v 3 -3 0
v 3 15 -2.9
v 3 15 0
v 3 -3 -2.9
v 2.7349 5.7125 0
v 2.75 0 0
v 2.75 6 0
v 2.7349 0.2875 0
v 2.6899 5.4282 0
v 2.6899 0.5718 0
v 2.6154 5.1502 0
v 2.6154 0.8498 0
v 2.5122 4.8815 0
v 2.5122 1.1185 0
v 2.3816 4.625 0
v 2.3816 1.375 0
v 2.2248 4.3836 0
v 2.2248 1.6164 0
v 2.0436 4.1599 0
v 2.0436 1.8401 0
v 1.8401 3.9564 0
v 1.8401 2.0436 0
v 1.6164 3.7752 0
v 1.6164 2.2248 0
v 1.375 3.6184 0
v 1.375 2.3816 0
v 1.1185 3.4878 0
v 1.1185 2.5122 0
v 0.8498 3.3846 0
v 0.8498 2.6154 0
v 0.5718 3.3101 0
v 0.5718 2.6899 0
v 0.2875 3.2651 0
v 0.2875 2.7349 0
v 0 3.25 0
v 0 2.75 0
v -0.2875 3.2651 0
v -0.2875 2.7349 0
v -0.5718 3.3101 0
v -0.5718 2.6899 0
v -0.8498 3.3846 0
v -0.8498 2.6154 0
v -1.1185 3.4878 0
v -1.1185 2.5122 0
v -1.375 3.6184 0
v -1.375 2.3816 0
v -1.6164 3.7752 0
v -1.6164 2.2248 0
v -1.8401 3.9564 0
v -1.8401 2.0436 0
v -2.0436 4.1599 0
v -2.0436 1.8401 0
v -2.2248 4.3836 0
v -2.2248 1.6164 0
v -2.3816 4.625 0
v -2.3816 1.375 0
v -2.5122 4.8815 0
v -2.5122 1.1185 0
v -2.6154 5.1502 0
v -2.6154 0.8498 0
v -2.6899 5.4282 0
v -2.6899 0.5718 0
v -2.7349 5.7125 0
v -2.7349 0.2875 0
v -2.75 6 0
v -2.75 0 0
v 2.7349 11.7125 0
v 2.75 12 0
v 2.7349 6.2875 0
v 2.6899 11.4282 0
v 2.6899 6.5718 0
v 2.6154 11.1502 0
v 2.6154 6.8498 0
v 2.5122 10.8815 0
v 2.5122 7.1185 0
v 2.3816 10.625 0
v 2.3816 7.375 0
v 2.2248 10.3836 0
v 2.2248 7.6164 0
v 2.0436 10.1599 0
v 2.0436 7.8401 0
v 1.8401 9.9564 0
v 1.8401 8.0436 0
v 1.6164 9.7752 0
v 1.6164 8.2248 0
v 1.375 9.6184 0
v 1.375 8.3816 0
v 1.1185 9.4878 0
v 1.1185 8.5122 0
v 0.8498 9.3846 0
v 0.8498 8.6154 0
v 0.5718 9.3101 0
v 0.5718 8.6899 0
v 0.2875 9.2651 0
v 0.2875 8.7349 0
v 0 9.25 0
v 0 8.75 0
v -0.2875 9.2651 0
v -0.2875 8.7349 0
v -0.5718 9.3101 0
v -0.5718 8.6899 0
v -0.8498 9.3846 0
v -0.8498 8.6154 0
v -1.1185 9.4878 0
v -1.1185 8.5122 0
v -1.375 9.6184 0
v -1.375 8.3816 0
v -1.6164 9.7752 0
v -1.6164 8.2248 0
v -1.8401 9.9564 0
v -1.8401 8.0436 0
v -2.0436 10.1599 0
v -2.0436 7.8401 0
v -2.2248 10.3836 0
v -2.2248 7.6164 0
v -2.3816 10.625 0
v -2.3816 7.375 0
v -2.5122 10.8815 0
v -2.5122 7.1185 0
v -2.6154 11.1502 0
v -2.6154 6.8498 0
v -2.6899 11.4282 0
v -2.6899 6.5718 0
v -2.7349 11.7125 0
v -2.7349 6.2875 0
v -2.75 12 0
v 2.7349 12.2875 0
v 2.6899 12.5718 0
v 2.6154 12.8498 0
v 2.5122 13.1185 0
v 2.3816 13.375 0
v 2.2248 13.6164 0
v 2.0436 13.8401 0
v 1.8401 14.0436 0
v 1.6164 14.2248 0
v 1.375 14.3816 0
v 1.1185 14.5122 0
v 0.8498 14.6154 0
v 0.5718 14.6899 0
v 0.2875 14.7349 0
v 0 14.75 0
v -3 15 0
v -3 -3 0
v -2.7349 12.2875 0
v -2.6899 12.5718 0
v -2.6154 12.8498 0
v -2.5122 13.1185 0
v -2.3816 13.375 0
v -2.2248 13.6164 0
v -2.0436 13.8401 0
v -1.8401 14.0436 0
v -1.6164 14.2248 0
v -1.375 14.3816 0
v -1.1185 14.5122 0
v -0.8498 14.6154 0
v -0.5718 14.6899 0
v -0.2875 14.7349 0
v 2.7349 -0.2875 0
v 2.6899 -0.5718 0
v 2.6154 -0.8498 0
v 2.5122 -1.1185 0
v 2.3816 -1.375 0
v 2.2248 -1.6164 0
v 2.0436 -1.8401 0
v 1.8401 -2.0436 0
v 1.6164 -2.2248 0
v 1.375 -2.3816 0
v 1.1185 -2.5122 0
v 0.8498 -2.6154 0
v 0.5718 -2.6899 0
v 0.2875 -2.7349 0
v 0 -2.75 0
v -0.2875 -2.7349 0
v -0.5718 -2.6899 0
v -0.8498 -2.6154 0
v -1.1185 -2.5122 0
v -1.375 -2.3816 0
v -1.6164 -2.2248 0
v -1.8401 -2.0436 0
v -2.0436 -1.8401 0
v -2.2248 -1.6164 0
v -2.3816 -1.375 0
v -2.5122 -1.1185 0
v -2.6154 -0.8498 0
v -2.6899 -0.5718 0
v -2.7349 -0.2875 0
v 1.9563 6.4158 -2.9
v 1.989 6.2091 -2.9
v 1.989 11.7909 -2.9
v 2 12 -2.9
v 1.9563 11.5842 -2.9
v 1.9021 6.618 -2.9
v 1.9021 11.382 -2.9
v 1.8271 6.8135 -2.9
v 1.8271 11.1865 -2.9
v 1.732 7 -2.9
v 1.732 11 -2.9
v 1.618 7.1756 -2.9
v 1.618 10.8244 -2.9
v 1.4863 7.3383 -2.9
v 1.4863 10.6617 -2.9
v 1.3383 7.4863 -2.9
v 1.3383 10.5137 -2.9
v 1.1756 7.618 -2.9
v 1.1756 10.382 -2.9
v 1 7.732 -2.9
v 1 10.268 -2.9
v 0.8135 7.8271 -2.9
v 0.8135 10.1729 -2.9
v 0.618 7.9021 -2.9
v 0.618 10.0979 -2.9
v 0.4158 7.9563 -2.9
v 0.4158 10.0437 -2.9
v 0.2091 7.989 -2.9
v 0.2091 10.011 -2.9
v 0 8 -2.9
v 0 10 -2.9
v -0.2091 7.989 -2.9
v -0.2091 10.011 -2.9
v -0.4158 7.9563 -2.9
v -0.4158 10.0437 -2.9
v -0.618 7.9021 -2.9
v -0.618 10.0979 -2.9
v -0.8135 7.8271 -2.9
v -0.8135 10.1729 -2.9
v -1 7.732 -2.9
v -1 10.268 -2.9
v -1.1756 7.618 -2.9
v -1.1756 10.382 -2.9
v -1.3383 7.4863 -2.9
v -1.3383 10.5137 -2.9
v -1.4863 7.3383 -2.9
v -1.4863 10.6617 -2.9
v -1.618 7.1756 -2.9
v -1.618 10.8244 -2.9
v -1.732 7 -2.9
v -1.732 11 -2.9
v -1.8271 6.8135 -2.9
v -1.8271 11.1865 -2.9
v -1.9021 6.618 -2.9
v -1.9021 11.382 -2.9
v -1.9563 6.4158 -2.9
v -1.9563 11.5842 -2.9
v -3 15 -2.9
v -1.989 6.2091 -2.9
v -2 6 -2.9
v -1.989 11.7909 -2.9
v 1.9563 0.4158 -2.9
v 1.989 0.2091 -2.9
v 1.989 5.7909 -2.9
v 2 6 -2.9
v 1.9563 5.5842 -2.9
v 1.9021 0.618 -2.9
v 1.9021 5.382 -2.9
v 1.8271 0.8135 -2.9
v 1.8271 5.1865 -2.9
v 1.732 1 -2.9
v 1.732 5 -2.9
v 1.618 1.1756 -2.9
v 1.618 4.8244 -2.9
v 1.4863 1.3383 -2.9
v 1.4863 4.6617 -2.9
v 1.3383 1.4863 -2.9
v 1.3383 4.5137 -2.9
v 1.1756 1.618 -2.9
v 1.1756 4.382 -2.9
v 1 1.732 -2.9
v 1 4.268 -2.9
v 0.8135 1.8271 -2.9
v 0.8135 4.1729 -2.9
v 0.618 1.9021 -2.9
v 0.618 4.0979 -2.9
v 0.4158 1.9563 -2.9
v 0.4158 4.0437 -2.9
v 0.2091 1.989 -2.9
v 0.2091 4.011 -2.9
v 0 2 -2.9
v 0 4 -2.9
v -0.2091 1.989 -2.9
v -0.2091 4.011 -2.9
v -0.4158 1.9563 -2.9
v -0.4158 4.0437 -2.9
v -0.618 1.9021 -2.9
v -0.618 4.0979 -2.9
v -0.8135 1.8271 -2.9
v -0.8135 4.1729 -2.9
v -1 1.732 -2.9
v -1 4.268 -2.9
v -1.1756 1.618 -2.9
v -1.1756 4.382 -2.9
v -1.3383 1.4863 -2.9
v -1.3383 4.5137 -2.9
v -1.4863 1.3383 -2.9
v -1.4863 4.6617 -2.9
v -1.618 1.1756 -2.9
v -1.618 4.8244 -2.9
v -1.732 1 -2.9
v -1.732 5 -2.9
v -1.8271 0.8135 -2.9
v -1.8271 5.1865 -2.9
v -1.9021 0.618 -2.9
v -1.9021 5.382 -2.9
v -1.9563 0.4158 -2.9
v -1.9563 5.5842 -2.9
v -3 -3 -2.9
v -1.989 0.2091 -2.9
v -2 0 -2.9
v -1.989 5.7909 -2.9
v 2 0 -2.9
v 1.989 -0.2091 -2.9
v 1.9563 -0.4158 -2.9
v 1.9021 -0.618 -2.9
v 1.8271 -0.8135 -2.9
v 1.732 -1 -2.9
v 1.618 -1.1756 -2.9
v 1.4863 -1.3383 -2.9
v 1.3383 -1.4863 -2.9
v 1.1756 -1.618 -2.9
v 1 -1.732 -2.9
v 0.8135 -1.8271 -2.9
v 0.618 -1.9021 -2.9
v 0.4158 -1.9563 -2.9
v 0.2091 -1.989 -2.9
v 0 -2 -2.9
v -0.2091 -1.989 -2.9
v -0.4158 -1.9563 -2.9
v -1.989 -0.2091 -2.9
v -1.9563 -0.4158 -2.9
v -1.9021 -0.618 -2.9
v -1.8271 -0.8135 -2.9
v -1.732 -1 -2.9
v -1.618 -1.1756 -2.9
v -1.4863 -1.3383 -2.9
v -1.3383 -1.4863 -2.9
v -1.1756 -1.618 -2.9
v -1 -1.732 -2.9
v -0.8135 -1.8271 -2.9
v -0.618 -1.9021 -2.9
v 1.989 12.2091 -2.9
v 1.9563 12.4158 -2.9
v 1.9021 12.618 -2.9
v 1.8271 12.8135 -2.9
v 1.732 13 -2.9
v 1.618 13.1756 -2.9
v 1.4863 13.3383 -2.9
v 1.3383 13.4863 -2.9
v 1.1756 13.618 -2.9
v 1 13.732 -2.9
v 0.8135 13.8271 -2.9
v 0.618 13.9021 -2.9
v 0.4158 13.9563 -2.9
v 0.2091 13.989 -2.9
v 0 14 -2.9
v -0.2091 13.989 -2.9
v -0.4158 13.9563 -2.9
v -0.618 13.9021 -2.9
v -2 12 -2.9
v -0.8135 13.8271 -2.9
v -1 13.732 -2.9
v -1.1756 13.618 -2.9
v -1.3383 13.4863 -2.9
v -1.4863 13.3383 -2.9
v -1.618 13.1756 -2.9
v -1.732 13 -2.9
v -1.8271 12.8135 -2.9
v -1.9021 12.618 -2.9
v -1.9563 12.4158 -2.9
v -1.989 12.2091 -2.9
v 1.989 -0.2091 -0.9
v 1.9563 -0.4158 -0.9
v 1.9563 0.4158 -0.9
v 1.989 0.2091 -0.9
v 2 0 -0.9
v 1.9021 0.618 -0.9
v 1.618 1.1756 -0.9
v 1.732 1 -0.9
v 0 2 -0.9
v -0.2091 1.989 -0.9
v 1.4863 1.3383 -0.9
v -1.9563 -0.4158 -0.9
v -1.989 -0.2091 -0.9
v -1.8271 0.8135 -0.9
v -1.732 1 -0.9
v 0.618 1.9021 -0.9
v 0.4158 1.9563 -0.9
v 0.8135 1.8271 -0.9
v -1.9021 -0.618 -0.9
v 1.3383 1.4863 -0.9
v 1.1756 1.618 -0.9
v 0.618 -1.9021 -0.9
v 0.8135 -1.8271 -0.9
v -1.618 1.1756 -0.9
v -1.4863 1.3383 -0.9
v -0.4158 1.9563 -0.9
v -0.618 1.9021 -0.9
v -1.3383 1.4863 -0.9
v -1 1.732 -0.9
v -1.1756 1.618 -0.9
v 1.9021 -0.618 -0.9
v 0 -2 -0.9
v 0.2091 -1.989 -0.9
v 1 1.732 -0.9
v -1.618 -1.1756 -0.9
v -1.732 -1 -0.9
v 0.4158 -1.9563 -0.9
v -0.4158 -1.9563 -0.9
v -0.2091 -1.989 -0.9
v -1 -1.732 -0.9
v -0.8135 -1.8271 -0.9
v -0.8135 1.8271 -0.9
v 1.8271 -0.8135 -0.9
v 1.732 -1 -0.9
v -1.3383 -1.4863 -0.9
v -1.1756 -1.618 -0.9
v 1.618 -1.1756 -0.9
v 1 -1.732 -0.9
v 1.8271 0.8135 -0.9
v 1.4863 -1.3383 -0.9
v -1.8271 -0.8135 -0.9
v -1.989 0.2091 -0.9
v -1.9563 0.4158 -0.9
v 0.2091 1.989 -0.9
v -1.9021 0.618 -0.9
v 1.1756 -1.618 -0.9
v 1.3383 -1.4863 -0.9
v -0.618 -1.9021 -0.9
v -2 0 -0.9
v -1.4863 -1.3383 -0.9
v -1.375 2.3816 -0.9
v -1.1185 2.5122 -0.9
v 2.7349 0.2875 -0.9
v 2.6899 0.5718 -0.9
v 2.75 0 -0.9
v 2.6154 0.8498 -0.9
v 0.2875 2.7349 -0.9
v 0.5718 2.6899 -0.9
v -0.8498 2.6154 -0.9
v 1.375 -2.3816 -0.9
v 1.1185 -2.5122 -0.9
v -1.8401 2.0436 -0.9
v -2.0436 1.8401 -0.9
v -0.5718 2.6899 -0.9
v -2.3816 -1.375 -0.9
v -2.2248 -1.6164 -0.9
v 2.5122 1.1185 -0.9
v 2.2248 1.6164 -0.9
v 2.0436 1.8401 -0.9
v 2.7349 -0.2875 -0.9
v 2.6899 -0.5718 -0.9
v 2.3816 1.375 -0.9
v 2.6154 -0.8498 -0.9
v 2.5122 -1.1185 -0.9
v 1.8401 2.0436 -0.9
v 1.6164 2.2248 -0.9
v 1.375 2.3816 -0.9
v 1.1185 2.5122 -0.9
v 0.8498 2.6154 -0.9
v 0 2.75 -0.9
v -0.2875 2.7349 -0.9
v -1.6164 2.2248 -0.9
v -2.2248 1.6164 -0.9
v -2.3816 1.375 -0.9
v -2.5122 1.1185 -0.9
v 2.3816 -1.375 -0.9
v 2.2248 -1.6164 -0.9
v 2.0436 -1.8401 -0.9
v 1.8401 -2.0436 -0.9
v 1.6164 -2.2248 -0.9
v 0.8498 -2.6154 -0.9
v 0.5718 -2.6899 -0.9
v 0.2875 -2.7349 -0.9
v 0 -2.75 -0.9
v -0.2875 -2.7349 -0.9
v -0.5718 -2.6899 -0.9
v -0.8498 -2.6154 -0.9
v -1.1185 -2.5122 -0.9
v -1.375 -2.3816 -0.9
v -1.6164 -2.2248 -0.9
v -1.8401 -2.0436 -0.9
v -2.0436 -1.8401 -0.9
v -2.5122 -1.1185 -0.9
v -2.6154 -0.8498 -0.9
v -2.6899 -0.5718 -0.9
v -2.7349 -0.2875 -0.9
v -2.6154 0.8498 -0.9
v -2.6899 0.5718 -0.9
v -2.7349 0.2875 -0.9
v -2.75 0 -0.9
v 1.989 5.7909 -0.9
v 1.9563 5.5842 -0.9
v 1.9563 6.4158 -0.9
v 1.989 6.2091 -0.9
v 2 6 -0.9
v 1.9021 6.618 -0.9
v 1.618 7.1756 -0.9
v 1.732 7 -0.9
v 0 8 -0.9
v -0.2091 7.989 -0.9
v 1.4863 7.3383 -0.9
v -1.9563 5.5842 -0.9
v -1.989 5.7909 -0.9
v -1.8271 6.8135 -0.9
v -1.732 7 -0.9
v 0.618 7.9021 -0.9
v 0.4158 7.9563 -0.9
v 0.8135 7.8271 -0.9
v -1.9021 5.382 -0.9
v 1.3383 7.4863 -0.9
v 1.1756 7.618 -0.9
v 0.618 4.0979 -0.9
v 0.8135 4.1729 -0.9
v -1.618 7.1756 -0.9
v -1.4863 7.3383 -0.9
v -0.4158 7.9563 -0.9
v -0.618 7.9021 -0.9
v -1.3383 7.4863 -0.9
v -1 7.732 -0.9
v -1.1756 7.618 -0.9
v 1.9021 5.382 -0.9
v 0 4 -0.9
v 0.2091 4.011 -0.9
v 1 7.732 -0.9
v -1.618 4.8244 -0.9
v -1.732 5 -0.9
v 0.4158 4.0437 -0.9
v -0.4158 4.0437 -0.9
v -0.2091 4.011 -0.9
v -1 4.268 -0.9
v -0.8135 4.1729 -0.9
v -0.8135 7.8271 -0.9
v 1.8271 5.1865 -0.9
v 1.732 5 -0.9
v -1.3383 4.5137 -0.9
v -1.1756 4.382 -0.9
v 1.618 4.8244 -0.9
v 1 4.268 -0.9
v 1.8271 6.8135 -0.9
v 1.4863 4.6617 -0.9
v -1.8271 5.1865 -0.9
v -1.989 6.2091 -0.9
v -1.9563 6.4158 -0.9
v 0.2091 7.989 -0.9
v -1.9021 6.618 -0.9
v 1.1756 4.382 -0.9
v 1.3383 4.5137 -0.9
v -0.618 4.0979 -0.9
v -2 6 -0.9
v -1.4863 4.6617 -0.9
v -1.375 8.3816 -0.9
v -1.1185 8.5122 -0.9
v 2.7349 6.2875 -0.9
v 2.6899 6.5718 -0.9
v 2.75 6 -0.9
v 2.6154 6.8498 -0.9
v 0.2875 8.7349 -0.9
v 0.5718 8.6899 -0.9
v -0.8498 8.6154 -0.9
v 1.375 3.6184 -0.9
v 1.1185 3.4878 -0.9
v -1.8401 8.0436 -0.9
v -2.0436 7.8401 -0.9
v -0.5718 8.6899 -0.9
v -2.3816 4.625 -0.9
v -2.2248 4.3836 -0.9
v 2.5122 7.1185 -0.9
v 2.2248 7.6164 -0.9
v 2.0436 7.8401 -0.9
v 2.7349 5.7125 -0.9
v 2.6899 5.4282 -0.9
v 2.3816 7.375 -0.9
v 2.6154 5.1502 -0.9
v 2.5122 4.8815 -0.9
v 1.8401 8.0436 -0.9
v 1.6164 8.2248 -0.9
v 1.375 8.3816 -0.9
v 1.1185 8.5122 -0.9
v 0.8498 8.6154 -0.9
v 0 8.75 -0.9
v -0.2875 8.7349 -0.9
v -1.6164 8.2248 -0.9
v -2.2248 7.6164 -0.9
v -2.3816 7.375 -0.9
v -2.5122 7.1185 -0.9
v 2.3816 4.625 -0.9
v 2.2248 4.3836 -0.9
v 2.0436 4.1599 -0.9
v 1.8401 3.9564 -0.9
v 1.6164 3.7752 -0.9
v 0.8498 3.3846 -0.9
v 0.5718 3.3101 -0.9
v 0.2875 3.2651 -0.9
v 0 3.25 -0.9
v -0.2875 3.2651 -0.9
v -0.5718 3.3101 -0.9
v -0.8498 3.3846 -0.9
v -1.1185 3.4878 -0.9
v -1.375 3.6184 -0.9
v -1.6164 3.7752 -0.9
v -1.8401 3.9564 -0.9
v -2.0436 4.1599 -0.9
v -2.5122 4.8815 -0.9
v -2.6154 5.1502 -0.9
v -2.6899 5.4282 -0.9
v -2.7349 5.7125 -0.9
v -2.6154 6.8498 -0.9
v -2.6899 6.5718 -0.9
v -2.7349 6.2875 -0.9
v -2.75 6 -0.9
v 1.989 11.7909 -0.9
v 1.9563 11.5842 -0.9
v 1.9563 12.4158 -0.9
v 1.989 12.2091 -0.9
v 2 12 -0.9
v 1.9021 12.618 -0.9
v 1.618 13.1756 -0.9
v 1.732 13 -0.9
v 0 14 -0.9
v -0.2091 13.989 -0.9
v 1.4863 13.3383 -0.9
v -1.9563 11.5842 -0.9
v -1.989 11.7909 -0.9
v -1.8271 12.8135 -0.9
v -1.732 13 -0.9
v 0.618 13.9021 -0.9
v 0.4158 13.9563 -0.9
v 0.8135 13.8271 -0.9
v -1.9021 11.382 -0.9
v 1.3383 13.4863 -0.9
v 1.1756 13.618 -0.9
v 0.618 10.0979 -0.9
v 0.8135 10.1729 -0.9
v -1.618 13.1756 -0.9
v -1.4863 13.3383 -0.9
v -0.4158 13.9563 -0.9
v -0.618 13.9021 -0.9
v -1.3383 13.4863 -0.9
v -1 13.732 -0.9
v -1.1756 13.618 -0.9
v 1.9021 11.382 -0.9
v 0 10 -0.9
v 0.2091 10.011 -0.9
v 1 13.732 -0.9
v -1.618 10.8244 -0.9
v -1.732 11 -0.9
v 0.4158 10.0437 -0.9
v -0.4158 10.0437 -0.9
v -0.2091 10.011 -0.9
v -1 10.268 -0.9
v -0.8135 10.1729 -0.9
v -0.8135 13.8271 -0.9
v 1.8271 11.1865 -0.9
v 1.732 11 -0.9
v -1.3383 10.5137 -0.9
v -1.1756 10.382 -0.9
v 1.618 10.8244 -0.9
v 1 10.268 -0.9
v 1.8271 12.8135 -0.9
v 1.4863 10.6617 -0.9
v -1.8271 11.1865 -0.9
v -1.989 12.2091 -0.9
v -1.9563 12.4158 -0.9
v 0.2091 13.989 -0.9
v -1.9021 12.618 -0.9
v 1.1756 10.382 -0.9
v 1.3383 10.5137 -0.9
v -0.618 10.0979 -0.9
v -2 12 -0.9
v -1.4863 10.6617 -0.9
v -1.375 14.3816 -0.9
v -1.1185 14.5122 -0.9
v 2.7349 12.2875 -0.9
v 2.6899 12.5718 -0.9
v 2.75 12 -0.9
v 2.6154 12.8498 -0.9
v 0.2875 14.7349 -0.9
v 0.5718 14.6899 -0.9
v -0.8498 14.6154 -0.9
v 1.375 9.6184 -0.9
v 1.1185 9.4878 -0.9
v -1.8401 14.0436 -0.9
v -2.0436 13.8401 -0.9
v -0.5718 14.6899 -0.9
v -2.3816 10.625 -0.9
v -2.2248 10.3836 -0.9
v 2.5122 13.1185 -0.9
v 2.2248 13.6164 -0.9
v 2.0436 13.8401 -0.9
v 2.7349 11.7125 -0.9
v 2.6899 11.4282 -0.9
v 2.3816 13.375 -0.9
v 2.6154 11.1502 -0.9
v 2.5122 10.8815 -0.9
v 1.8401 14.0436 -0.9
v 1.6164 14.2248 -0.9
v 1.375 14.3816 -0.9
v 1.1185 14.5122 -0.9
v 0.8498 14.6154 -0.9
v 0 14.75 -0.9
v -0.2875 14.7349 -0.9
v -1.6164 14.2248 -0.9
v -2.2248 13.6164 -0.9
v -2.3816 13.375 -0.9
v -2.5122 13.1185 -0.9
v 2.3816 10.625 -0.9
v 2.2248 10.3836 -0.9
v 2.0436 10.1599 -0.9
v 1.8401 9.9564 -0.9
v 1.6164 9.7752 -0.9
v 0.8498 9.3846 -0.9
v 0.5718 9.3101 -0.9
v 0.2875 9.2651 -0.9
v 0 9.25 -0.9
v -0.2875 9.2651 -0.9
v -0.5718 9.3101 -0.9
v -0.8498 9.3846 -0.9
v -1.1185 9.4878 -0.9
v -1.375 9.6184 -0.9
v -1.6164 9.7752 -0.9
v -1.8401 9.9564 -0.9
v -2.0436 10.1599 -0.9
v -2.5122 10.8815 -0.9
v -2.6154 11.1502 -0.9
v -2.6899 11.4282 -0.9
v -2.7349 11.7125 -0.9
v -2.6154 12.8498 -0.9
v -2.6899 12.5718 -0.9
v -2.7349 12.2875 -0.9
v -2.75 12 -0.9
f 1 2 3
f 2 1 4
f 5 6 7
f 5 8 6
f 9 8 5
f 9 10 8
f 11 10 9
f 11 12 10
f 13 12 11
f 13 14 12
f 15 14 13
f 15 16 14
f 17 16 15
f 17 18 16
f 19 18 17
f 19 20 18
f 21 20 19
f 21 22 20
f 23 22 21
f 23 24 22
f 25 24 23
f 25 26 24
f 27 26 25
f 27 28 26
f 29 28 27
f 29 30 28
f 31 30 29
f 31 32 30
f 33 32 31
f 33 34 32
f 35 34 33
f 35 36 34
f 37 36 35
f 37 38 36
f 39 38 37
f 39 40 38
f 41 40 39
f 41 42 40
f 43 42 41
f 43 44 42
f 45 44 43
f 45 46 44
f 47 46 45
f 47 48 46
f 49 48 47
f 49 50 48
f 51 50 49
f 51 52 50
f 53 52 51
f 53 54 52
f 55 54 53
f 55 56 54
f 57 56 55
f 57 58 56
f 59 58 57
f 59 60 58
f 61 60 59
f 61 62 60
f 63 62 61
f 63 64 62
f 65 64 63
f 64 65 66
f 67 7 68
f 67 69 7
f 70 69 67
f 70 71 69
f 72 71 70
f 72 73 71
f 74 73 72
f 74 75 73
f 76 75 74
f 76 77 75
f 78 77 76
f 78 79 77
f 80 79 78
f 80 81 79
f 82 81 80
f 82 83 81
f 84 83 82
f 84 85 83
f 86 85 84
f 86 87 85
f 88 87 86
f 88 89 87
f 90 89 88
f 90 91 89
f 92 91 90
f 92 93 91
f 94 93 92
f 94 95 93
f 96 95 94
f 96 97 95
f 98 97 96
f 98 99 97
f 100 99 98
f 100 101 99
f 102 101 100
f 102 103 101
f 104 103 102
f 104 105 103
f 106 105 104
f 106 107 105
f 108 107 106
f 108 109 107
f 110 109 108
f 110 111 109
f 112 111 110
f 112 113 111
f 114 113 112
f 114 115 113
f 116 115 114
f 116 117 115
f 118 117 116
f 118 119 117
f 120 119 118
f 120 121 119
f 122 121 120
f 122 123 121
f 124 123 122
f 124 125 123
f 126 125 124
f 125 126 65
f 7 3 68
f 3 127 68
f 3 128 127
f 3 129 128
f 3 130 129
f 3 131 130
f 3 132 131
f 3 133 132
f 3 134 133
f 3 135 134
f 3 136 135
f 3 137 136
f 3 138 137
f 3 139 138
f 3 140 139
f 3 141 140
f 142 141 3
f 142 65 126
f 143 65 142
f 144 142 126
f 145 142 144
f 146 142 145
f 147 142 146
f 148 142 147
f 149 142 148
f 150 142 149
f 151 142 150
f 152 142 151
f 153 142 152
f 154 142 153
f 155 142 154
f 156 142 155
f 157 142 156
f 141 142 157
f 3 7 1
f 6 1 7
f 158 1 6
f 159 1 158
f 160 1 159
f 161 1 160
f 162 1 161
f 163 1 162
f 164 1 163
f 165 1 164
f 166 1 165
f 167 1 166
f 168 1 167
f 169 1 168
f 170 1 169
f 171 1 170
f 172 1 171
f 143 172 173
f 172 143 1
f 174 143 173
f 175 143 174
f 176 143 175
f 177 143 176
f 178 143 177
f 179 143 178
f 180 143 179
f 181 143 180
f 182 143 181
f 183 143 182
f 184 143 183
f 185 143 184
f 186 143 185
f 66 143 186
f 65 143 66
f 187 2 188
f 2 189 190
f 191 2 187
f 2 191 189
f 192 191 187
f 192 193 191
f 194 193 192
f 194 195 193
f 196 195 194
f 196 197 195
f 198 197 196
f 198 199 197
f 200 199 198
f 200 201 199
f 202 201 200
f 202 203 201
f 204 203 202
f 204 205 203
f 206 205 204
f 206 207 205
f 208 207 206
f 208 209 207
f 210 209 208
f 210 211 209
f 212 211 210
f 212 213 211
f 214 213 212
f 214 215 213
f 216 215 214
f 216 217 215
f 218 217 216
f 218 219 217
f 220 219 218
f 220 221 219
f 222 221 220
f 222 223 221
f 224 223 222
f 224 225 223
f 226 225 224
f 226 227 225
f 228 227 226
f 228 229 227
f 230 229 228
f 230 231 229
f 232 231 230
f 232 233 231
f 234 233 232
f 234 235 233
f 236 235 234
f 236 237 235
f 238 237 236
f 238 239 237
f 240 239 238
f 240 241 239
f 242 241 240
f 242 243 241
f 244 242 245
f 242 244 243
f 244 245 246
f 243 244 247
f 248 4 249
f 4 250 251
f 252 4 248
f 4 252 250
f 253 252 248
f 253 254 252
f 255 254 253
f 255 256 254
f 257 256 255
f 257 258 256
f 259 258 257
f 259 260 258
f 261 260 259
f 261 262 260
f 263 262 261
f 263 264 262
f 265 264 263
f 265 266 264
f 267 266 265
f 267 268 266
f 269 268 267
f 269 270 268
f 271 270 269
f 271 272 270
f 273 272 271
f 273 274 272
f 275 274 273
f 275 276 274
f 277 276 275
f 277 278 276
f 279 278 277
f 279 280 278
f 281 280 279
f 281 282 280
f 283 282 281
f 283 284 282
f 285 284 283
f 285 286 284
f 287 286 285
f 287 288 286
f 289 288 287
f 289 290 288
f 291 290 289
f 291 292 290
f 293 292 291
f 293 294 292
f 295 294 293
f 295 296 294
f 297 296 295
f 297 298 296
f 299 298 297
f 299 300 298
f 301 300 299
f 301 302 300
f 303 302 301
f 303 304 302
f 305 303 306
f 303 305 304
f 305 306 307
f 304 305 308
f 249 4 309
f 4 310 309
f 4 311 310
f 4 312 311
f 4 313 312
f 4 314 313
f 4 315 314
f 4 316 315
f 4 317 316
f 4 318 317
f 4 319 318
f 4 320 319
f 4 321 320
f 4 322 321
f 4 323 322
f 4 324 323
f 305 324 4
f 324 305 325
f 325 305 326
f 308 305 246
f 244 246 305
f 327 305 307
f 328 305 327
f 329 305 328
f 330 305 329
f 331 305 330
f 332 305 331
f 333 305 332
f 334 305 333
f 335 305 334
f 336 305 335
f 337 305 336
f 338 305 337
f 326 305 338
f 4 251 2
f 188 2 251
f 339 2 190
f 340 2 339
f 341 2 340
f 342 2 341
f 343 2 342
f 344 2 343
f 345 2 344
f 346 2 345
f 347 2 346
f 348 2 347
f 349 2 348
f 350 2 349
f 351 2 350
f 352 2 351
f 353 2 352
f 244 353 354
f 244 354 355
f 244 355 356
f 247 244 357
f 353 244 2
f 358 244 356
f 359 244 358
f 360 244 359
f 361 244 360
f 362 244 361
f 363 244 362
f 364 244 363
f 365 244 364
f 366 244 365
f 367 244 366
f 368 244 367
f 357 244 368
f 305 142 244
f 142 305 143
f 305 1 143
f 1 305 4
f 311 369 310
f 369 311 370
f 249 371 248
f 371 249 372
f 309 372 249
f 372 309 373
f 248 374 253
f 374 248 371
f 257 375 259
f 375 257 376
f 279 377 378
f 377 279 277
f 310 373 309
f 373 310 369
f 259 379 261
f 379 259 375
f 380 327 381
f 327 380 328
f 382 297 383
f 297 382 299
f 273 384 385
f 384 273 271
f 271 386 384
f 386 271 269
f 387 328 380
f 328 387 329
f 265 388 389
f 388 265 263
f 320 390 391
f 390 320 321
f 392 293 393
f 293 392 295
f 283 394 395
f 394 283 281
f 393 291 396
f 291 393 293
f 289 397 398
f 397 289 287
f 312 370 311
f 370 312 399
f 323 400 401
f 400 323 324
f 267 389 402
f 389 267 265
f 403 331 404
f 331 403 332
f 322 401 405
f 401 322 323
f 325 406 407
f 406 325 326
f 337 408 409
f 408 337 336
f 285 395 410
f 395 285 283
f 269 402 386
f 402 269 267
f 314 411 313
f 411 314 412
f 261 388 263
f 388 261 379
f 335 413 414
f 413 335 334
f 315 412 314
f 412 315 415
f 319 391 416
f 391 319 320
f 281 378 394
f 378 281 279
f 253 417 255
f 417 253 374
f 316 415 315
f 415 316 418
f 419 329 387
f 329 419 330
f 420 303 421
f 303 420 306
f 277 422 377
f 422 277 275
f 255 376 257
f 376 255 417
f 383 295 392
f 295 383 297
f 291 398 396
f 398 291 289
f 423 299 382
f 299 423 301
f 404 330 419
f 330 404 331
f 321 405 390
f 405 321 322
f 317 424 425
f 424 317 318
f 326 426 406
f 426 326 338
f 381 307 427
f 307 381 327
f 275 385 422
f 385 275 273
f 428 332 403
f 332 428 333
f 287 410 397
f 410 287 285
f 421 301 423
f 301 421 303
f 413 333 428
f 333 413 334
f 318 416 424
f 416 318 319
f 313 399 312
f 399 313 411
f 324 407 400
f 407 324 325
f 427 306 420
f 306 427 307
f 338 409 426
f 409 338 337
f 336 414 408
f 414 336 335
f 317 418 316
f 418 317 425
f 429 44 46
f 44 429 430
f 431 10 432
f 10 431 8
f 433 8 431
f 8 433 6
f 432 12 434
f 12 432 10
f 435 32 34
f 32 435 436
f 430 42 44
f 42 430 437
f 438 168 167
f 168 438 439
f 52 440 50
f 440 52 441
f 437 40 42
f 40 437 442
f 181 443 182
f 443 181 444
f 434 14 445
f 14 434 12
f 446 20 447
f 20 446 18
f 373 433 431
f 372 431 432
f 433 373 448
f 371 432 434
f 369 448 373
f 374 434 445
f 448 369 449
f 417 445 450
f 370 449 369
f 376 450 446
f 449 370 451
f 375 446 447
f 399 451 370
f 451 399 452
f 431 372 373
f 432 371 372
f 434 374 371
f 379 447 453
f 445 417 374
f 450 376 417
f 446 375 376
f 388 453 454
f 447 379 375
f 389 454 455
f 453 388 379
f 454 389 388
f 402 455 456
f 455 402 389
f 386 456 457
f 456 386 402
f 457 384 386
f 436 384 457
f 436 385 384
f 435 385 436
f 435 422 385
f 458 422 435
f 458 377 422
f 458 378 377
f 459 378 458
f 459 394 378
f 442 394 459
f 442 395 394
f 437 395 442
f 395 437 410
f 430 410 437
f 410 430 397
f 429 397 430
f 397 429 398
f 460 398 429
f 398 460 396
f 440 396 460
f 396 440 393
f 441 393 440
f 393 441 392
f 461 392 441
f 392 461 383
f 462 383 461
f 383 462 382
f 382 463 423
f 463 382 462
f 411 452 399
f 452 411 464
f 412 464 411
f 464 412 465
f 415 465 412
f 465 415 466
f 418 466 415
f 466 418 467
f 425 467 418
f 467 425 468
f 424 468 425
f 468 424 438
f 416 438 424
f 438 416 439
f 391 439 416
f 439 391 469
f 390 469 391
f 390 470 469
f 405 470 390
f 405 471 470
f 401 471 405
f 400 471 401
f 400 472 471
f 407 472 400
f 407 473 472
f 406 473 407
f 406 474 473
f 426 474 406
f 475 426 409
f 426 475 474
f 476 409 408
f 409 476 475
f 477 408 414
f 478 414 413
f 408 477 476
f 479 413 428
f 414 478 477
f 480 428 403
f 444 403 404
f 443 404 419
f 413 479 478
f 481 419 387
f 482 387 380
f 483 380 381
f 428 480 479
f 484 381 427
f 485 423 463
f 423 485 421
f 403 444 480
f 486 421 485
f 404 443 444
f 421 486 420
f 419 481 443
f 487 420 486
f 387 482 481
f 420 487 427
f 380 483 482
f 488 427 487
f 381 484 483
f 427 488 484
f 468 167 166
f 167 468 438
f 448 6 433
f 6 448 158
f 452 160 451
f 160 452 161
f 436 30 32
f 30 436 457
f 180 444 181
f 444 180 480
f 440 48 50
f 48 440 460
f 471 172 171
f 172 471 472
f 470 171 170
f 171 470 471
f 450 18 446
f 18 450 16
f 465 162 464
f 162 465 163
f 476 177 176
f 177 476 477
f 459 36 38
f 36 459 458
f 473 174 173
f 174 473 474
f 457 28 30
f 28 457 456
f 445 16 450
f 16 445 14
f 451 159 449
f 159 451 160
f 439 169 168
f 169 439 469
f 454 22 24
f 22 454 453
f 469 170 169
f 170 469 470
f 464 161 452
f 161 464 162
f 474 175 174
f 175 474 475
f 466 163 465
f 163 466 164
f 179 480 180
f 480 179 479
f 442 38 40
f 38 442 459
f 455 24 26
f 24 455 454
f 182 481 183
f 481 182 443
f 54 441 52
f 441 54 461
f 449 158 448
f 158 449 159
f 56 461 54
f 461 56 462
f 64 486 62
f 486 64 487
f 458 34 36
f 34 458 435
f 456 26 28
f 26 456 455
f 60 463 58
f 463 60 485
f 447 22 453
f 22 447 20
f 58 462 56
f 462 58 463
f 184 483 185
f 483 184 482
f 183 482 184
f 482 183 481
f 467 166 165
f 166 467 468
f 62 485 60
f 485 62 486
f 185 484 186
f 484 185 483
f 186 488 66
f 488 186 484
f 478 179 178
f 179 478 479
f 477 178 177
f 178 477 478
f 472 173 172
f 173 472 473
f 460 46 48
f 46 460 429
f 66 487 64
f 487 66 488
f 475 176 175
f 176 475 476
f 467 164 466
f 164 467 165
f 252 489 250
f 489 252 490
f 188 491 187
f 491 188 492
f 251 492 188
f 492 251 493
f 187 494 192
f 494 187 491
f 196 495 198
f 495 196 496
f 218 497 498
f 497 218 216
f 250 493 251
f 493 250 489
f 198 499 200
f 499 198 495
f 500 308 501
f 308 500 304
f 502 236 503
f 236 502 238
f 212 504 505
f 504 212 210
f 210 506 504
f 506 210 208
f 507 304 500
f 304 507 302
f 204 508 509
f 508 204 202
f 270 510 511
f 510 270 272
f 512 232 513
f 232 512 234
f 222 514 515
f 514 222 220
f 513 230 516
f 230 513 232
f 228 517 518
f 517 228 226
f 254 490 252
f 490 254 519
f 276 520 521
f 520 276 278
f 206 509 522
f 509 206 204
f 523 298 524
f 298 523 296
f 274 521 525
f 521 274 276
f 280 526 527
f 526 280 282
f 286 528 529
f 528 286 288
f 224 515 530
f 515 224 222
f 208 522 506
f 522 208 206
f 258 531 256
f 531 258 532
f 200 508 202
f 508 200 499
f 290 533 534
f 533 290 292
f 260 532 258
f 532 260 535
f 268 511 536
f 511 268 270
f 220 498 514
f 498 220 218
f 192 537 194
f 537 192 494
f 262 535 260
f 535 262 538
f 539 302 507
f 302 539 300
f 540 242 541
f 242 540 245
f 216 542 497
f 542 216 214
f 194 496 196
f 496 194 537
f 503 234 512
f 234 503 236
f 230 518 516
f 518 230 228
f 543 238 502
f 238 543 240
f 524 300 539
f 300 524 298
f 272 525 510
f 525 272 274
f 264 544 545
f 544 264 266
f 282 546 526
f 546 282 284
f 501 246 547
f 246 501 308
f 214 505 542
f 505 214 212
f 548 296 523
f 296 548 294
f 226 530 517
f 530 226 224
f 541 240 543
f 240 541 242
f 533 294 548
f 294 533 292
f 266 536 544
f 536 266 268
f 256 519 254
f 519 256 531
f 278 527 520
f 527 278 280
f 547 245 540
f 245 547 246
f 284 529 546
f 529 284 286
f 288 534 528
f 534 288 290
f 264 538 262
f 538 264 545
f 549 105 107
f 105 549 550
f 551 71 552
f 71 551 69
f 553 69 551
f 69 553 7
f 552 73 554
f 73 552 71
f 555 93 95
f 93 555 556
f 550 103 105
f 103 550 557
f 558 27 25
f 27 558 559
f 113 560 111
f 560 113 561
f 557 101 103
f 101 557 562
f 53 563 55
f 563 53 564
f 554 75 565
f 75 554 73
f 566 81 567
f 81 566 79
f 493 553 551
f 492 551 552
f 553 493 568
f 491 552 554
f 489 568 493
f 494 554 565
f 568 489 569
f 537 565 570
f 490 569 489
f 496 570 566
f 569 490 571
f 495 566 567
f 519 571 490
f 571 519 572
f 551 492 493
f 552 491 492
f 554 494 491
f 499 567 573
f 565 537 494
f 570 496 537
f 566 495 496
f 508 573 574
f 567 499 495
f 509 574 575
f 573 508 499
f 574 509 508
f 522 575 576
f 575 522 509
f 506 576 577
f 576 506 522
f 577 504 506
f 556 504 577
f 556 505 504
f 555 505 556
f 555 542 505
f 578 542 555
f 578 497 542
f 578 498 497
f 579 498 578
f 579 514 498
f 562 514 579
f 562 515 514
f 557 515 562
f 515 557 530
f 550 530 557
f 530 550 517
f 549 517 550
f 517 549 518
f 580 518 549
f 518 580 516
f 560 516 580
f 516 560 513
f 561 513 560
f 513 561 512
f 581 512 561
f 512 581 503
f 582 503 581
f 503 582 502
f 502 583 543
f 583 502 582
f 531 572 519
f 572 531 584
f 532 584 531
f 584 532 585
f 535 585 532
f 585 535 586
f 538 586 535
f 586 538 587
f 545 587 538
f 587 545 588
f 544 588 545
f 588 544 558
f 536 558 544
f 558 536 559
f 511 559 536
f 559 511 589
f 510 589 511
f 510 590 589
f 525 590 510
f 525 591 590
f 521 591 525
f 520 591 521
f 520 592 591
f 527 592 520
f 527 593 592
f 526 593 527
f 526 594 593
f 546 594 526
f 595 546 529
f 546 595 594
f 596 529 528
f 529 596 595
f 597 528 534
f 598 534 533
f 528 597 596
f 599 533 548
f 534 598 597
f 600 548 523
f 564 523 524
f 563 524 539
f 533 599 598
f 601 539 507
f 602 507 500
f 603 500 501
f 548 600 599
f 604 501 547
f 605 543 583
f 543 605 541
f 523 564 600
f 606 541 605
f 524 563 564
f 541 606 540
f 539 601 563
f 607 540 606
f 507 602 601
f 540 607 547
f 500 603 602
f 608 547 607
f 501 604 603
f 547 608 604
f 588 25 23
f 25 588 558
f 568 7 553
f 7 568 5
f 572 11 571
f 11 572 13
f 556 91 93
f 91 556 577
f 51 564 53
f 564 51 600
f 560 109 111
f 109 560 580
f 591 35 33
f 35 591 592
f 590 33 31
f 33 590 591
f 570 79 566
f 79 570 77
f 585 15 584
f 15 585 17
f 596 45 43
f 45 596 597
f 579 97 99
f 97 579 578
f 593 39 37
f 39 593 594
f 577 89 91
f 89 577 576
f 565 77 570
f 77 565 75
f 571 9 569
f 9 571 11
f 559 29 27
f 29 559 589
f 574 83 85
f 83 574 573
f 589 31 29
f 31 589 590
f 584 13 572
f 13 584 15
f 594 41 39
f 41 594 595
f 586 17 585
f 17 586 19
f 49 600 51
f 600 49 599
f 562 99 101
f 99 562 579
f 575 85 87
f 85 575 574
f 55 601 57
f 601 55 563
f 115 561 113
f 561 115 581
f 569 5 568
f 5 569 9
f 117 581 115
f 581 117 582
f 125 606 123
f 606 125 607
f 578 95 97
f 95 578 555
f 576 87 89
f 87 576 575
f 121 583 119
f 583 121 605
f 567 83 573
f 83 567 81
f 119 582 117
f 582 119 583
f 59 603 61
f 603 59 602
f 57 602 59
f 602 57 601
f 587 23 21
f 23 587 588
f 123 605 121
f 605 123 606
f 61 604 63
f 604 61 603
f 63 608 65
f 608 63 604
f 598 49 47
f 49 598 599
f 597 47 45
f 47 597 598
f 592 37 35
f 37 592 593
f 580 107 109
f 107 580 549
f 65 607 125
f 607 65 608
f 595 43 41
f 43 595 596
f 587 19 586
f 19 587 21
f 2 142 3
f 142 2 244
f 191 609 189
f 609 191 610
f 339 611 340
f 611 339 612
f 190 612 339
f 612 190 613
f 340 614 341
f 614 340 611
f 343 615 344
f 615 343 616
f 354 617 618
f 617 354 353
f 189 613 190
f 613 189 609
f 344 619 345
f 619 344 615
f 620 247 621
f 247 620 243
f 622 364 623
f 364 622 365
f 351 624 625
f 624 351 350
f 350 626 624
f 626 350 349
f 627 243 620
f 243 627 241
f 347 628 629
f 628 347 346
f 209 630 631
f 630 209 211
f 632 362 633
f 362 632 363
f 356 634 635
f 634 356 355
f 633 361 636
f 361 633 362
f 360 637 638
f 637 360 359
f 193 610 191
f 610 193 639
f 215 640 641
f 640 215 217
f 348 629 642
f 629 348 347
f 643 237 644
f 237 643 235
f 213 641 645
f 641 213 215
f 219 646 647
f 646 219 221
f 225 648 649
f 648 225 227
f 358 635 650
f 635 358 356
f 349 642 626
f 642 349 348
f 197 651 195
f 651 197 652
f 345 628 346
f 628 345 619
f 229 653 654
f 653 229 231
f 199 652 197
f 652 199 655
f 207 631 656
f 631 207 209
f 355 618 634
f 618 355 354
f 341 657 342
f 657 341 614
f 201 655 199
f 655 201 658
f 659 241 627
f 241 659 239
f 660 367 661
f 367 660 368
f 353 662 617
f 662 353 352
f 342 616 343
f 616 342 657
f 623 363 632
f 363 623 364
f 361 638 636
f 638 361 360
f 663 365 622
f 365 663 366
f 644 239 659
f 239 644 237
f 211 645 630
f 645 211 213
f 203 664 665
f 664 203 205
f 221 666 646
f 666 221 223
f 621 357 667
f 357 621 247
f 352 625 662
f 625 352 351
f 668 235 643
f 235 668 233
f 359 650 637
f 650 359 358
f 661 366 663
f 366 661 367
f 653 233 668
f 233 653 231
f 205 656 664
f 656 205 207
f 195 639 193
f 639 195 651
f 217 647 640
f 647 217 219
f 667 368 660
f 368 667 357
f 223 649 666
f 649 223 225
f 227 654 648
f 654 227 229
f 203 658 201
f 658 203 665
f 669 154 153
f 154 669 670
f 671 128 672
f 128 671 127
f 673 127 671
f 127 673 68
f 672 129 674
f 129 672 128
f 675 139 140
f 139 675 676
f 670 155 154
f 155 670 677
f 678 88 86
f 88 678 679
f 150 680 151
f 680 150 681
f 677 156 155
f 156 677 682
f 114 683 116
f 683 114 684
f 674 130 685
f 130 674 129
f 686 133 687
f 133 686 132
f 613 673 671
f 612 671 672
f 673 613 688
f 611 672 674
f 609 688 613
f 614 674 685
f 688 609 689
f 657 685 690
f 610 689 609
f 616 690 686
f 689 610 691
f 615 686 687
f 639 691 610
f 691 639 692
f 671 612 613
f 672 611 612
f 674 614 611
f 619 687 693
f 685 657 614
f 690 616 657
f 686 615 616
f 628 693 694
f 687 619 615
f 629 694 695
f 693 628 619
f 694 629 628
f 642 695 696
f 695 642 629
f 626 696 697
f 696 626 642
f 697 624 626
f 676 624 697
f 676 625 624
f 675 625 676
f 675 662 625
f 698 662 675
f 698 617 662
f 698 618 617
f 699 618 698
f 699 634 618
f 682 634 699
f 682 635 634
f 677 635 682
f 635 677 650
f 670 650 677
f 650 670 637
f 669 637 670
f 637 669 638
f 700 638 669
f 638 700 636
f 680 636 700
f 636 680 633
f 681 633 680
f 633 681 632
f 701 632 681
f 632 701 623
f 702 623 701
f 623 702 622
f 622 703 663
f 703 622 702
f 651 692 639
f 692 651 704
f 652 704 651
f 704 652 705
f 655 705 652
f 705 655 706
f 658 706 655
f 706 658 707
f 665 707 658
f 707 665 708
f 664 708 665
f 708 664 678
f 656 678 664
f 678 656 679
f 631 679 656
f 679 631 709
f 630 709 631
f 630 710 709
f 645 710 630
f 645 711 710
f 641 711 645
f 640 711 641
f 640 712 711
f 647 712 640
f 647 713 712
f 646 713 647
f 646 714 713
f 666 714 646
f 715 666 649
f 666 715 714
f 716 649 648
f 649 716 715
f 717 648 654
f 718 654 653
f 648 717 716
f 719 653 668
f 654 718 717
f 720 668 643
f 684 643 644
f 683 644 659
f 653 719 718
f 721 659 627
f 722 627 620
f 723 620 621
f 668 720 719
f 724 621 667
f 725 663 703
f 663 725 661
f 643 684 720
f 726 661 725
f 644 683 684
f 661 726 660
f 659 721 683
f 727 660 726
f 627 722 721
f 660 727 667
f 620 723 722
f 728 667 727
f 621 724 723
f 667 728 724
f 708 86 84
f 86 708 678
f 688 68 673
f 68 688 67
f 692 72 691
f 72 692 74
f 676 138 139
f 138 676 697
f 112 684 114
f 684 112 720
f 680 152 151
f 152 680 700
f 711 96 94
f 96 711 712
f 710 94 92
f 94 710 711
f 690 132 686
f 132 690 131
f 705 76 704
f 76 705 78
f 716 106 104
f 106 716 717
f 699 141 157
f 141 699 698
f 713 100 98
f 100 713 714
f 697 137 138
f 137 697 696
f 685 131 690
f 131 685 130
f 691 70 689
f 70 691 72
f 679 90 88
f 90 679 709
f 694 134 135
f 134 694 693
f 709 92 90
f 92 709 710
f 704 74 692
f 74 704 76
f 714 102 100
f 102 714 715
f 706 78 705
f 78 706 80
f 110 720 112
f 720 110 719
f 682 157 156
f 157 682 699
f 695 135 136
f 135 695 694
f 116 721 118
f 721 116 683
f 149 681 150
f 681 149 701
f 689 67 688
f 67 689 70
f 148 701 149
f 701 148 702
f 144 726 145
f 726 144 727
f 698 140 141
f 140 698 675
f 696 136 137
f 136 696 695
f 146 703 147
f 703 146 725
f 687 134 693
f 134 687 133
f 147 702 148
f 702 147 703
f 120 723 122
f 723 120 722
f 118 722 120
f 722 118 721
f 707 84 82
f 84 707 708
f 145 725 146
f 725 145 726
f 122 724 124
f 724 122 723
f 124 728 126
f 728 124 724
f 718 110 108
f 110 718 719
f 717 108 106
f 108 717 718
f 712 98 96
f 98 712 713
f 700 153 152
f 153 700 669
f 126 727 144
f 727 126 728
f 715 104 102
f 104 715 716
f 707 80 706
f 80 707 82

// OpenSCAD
size = 6;
height = 2.9;
experimental= 0.9;

d_inner = 4.0;
d_outer = 5.5;

$fn = 60;

module nonlego(){
    difference(){
        translate([0, 0, -height/2]){cube([size, size, height], center = true);}
        translate([0, 0, -height/2]){cylinder(h = height+1, r = d_inner/2, center = true);}
    cylinder(h = 2*experimental, r = d_outer/2, center = true);    
    }
}


module hole(){
    difference(){
        cube([4, 4, 7], center = true);
        translate([0, 0, 0.5]){
            cylinder(h = 6, r = 0.9, center = true);
        }
    }
}

union(){
    nonlego();
    translate([0, size, 0]){nonlego();}
    translate([0, 2*size, 0]){nonlego();}
}
